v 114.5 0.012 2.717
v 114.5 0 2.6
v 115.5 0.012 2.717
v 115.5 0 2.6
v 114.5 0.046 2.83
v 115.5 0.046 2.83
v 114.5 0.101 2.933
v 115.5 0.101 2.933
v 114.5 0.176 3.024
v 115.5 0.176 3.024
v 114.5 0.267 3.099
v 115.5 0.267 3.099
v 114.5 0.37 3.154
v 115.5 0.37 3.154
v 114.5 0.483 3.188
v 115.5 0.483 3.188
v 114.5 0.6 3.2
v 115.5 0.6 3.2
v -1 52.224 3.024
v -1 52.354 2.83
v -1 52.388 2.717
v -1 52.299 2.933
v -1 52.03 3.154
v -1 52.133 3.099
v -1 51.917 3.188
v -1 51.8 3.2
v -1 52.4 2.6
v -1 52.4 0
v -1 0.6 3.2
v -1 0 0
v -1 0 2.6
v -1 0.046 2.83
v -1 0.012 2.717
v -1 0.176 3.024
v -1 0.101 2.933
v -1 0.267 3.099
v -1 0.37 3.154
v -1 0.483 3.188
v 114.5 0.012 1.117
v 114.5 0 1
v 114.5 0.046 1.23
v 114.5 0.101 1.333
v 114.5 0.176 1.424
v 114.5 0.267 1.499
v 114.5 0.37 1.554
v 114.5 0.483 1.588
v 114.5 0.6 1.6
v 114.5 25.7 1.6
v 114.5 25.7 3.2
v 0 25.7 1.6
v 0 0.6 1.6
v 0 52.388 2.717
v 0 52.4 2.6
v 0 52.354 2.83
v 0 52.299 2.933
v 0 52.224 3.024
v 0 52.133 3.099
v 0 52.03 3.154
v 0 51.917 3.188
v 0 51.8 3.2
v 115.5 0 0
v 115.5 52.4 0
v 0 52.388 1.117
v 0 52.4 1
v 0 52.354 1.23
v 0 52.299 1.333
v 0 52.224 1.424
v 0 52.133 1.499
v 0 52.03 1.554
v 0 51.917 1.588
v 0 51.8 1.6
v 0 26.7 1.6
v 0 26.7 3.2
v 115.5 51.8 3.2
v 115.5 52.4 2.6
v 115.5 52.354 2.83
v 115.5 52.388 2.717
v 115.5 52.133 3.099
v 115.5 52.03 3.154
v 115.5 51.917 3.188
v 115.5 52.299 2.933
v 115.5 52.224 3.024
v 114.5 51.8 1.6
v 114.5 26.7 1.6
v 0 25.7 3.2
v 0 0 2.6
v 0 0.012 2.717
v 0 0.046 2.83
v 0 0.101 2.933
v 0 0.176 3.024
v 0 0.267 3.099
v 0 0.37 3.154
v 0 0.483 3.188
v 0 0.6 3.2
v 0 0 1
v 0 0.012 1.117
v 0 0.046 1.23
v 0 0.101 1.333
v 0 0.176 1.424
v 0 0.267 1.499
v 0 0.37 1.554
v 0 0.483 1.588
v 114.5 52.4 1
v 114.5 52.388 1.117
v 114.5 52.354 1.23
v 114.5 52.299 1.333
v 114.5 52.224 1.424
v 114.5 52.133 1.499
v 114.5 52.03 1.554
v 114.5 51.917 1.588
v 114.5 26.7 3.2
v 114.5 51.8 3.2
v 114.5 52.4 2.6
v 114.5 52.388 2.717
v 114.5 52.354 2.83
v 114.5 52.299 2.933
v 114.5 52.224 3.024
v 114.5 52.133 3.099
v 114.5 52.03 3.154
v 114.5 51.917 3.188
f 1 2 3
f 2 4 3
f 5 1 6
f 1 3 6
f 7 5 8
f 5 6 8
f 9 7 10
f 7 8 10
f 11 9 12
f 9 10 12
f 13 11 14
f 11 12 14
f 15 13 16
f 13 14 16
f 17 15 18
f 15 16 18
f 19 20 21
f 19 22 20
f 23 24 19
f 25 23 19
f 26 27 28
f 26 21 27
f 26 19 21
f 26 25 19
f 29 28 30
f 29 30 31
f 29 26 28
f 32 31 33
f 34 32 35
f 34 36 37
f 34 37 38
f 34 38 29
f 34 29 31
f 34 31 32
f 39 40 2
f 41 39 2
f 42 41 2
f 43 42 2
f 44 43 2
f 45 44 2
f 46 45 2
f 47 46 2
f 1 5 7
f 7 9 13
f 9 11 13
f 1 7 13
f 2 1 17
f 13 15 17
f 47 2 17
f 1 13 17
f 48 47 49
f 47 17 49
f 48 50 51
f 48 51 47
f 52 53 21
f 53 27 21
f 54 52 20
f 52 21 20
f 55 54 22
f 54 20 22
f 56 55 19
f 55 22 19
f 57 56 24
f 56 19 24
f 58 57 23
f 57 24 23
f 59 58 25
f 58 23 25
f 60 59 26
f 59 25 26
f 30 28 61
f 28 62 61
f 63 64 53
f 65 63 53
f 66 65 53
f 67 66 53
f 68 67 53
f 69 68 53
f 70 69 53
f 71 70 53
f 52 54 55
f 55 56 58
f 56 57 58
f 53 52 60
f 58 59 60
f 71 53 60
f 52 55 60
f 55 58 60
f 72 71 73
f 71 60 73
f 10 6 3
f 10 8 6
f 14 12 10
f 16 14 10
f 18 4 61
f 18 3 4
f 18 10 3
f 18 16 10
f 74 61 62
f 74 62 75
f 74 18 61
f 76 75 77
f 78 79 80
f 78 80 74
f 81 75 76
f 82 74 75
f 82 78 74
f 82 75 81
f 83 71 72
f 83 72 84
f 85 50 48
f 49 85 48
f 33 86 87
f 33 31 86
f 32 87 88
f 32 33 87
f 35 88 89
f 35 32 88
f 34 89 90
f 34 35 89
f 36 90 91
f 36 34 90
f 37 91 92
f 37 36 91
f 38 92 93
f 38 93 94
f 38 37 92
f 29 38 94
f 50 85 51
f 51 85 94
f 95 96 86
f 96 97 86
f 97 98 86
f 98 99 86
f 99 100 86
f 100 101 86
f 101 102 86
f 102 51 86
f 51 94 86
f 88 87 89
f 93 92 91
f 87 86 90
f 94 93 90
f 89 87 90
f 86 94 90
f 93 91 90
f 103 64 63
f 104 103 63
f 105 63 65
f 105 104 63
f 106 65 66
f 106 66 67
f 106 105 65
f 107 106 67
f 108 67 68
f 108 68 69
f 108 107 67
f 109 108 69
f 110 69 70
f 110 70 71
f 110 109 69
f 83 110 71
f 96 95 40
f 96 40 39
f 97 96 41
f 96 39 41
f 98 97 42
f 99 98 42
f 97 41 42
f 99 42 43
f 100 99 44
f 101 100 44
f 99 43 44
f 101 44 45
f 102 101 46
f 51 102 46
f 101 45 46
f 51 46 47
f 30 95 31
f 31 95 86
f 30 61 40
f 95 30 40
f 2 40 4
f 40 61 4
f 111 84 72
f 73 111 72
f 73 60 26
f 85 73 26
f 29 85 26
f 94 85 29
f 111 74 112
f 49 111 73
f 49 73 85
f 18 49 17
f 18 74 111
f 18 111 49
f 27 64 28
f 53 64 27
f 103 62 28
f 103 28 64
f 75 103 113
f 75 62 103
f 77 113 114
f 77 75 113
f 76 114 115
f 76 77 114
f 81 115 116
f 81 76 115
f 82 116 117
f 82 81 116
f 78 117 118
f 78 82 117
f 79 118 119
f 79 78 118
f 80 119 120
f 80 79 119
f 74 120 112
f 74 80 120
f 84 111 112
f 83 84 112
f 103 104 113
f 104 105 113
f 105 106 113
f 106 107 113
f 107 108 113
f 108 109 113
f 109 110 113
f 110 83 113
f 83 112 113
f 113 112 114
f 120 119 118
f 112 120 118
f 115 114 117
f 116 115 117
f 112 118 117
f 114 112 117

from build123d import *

# Parameters (mm, degrees)
F0_W      = 114.5
F0_H      = 52.4
F1_DEPTH  = 1.6
F2_R      = 0.6
F3_W      = 52.4
F3_H      = 3.2
F4_DEPTH  = 1
F5_R      = 0.6
F6_W      = 52.4
F6_H      = 3.2
F7_DEPTH  = 1
F8_R      = 0.6
F10_DEPTH = 1.6


with BuildPart() as f1:
    # F0 (on Top) → F1 (new body)
    with BuildSketch(Plane.XY):
        with Locations((57.25, 26.2)):
            Rectangle(F0_W, F0_H)
    extrude(amount=F1_DEPTH)

    # F2
    f2_edges = [f1.edges().sort_by_distance(p)[0] for p in [
        (57.25, 0, 1.6),
        (57.25, 52.4, 1.6),
    ]]
    fillet(f2_edges, radius=F2_R)

    # F3 (on face) → F4 (join)
    with BuildSketch(Plane.YZ.offset(114.5)):
        with Locations((26.2, 1.6)):
            Rectangle(F3_W, F3_H)
    extrude(amount=F4_DEPTH)

    # F5
    f5_edges = [f1.edges().sort_by_distance(p)[0] for p in [
        (115, 52.4, 3.2),
        (115, 0, 3.2),
    ]]
    fillet(f5_edges, radius=F5_R)

    # F6 (on face) → F7 (join)
    with BuildSketch(Plane(origin=(0, 0, 0), x_dir=(0, -1, 0), z_dir=(-1, 0, 0))):
        with Locations((-26.2, 1.6)):
            Rectangle(F6_W, F6_H)
    extrude(amount=F7_DEPTH)

    # F8
    f8_edges = [f1.edges().sort_by_distance(p)[0] for p in [
        (-0.5, 0, 3.2),
        (-0.5, 52.4, 3.2),
    ]]
    fillet(f8_edges, radius=F8_R)

    # F9 (on face) → F10 (join, through all)
    with BuildSketch(Plane.XY.offset(1.6)):
        Polygon((0, 26.7), (0, 25.7), (114.5, 25.7), (114.5, 26.2), (114.5, 26.7), align=None)
    extrude(amount=F10_DEPTH)


solid = f1.part
